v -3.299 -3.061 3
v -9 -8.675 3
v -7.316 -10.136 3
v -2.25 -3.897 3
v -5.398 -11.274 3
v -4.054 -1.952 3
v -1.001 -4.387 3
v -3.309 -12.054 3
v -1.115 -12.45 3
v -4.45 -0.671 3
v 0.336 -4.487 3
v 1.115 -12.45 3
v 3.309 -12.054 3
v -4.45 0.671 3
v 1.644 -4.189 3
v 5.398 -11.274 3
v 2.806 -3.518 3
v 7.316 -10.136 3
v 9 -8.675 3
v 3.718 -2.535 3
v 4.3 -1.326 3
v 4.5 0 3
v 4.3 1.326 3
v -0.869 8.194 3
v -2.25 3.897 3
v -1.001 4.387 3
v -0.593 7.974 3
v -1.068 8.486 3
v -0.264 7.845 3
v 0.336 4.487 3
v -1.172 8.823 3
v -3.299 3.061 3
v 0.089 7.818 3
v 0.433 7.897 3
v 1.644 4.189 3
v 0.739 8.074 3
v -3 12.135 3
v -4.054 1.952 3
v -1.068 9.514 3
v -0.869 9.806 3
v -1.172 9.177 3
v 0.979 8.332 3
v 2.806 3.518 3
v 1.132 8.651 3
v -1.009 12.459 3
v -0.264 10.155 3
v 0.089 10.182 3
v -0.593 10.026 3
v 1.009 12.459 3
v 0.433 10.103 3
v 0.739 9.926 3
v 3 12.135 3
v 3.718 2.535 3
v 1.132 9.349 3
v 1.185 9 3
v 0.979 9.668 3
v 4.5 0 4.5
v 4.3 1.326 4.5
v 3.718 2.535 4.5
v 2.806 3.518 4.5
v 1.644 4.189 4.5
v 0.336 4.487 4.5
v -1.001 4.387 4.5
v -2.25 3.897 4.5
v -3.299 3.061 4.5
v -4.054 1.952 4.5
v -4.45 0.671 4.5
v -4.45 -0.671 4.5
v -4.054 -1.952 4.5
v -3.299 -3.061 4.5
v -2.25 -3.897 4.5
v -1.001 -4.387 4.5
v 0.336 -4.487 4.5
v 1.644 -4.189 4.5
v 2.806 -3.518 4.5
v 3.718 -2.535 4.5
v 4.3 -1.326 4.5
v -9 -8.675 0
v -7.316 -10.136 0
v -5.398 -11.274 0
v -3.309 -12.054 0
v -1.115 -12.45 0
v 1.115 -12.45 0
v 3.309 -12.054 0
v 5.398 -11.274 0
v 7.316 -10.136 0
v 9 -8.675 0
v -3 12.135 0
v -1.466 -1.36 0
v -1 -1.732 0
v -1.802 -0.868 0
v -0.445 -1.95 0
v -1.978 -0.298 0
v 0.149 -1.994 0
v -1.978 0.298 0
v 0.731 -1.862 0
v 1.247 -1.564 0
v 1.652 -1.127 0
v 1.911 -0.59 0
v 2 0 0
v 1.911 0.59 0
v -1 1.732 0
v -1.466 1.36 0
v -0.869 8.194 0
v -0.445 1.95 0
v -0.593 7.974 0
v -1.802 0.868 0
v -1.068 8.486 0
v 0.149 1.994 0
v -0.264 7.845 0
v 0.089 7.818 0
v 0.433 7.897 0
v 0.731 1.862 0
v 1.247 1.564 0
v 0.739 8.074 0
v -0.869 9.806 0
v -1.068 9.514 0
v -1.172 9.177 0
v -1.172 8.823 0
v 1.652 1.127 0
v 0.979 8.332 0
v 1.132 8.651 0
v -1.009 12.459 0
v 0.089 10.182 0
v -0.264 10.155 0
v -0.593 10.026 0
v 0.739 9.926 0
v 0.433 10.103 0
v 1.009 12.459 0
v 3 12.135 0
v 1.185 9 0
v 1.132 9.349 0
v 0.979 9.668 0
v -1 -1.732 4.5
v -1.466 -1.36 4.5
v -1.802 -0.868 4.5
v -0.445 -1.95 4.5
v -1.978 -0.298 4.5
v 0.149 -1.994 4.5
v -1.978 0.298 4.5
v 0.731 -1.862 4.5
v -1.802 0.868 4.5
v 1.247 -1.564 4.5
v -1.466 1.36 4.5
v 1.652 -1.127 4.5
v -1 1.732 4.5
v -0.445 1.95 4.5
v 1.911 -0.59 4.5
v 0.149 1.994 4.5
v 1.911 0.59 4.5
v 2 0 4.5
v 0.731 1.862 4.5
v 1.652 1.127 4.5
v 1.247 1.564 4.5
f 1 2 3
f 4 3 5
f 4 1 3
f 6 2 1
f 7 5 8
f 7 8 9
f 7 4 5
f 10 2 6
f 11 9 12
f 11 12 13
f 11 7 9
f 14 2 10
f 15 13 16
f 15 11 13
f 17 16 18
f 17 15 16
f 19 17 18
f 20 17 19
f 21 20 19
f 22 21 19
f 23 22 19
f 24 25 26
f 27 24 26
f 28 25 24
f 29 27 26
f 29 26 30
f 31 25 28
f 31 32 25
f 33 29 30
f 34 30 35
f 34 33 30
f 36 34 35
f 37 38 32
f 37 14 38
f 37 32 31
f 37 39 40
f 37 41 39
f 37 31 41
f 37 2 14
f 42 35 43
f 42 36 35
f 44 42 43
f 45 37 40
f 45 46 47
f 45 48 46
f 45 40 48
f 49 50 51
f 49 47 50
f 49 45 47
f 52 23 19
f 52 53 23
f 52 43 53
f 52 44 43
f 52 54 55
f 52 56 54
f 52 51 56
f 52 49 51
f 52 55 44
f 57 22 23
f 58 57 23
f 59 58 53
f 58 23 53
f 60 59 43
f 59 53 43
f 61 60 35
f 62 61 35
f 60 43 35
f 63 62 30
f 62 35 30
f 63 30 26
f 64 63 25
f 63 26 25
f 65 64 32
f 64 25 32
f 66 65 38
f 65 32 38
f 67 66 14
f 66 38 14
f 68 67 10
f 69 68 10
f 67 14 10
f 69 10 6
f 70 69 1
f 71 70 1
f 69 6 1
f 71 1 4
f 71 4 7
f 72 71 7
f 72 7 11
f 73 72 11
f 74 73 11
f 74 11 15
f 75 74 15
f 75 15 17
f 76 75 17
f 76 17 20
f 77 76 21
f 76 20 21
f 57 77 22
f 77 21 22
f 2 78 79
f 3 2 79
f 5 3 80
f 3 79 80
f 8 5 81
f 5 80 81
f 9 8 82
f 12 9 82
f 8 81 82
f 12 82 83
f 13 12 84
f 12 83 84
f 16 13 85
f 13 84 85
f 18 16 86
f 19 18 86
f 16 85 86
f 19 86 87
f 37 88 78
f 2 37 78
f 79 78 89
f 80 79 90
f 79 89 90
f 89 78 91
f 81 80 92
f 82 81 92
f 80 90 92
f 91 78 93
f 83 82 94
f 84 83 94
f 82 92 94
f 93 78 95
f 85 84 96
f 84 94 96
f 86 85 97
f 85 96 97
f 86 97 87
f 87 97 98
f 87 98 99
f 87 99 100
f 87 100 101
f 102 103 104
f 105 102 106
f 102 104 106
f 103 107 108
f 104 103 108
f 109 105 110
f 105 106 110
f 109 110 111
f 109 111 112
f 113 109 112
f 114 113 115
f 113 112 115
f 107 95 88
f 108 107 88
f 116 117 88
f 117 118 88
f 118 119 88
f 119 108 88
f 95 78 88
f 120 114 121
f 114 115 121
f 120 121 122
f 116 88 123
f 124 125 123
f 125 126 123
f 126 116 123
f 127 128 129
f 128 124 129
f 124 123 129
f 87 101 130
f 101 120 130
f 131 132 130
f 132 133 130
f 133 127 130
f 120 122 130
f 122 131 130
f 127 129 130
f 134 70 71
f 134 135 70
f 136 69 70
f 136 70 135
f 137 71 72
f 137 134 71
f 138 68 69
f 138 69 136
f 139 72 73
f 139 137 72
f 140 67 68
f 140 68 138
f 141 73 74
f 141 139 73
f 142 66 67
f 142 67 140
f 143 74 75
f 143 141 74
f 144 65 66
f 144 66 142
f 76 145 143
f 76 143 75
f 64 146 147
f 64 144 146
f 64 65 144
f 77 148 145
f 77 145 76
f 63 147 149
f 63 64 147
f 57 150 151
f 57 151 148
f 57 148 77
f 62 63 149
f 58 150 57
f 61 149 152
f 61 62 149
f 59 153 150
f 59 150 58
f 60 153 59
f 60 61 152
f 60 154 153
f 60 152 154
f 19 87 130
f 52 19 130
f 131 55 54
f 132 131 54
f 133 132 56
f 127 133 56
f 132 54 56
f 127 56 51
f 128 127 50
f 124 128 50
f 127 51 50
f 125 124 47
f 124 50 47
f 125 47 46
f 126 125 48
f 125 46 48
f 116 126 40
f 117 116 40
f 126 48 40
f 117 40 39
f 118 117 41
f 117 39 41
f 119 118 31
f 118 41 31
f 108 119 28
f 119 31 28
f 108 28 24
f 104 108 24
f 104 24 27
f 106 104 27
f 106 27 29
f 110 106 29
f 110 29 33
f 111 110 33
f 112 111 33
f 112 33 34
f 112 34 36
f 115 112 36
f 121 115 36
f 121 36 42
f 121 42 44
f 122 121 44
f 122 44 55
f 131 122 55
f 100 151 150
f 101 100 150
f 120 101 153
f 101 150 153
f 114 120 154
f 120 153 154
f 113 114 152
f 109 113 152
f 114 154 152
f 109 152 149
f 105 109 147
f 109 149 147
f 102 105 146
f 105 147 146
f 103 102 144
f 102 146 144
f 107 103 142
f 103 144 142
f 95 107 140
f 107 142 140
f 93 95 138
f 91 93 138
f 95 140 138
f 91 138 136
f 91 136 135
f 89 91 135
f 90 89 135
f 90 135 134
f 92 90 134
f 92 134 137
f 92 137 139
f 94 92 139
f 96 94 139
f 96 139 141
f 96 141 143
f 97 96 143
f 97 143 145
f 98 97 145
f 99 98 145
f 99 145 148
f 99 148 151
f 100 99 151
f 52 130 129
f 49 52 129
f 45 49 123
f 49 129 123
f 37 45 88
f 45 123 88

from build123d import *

# Parameters (mm, degrees)
F1_DEPTH = 3
F2_R     = 1.185
F3_DEPTH = 3.001
F4_R     = 4.5
F5_DEPTH = 1.5
F6_R     = 2
F7_DEPTH = 4.501


with BuildPart() as f1:
    # F0 (on Top) → F1 (new body)
    with BuildSketch(Plane.XY):
        with BuildLine():
            Line((-3, 12.134661), (-9, -8.674676))
            ThreePointArc((-9, -8.674676), (0, -12.5), (9, -8.674676))
            Line((9, -8.674676), (3, 12.134661))
            ThreePointArc((3, 12.134661), (0, 12.5), (-3, 12.134661))
        make_face()
    extrude(amount=F1_DEPTH)

    # F2 (on face) → F3 (cut, through all)
    with BuildSketch(Plane.XY.offset(3)):
        with Locations((0, 9)):
            Circle(F2_R)
    extrude(amount=-F3_DEPTH, mode=Mode.SUBTRACT)

    # F4 (on face) → F5 (join)
    with BuildSketch(Plane.XY.offset(3)):
        Circle(F4_R)
    extrude(amount=F5_DEPTH)

    # F6 (on face) → F7 (cut, through all)
    with BuildSketch(Plane.XY.offset(4.5)):
        Circle(F6_R)
    extrude(amount=-F7_DEPTH, mode=Mode.SUBTRACT)


solid = f1.part
